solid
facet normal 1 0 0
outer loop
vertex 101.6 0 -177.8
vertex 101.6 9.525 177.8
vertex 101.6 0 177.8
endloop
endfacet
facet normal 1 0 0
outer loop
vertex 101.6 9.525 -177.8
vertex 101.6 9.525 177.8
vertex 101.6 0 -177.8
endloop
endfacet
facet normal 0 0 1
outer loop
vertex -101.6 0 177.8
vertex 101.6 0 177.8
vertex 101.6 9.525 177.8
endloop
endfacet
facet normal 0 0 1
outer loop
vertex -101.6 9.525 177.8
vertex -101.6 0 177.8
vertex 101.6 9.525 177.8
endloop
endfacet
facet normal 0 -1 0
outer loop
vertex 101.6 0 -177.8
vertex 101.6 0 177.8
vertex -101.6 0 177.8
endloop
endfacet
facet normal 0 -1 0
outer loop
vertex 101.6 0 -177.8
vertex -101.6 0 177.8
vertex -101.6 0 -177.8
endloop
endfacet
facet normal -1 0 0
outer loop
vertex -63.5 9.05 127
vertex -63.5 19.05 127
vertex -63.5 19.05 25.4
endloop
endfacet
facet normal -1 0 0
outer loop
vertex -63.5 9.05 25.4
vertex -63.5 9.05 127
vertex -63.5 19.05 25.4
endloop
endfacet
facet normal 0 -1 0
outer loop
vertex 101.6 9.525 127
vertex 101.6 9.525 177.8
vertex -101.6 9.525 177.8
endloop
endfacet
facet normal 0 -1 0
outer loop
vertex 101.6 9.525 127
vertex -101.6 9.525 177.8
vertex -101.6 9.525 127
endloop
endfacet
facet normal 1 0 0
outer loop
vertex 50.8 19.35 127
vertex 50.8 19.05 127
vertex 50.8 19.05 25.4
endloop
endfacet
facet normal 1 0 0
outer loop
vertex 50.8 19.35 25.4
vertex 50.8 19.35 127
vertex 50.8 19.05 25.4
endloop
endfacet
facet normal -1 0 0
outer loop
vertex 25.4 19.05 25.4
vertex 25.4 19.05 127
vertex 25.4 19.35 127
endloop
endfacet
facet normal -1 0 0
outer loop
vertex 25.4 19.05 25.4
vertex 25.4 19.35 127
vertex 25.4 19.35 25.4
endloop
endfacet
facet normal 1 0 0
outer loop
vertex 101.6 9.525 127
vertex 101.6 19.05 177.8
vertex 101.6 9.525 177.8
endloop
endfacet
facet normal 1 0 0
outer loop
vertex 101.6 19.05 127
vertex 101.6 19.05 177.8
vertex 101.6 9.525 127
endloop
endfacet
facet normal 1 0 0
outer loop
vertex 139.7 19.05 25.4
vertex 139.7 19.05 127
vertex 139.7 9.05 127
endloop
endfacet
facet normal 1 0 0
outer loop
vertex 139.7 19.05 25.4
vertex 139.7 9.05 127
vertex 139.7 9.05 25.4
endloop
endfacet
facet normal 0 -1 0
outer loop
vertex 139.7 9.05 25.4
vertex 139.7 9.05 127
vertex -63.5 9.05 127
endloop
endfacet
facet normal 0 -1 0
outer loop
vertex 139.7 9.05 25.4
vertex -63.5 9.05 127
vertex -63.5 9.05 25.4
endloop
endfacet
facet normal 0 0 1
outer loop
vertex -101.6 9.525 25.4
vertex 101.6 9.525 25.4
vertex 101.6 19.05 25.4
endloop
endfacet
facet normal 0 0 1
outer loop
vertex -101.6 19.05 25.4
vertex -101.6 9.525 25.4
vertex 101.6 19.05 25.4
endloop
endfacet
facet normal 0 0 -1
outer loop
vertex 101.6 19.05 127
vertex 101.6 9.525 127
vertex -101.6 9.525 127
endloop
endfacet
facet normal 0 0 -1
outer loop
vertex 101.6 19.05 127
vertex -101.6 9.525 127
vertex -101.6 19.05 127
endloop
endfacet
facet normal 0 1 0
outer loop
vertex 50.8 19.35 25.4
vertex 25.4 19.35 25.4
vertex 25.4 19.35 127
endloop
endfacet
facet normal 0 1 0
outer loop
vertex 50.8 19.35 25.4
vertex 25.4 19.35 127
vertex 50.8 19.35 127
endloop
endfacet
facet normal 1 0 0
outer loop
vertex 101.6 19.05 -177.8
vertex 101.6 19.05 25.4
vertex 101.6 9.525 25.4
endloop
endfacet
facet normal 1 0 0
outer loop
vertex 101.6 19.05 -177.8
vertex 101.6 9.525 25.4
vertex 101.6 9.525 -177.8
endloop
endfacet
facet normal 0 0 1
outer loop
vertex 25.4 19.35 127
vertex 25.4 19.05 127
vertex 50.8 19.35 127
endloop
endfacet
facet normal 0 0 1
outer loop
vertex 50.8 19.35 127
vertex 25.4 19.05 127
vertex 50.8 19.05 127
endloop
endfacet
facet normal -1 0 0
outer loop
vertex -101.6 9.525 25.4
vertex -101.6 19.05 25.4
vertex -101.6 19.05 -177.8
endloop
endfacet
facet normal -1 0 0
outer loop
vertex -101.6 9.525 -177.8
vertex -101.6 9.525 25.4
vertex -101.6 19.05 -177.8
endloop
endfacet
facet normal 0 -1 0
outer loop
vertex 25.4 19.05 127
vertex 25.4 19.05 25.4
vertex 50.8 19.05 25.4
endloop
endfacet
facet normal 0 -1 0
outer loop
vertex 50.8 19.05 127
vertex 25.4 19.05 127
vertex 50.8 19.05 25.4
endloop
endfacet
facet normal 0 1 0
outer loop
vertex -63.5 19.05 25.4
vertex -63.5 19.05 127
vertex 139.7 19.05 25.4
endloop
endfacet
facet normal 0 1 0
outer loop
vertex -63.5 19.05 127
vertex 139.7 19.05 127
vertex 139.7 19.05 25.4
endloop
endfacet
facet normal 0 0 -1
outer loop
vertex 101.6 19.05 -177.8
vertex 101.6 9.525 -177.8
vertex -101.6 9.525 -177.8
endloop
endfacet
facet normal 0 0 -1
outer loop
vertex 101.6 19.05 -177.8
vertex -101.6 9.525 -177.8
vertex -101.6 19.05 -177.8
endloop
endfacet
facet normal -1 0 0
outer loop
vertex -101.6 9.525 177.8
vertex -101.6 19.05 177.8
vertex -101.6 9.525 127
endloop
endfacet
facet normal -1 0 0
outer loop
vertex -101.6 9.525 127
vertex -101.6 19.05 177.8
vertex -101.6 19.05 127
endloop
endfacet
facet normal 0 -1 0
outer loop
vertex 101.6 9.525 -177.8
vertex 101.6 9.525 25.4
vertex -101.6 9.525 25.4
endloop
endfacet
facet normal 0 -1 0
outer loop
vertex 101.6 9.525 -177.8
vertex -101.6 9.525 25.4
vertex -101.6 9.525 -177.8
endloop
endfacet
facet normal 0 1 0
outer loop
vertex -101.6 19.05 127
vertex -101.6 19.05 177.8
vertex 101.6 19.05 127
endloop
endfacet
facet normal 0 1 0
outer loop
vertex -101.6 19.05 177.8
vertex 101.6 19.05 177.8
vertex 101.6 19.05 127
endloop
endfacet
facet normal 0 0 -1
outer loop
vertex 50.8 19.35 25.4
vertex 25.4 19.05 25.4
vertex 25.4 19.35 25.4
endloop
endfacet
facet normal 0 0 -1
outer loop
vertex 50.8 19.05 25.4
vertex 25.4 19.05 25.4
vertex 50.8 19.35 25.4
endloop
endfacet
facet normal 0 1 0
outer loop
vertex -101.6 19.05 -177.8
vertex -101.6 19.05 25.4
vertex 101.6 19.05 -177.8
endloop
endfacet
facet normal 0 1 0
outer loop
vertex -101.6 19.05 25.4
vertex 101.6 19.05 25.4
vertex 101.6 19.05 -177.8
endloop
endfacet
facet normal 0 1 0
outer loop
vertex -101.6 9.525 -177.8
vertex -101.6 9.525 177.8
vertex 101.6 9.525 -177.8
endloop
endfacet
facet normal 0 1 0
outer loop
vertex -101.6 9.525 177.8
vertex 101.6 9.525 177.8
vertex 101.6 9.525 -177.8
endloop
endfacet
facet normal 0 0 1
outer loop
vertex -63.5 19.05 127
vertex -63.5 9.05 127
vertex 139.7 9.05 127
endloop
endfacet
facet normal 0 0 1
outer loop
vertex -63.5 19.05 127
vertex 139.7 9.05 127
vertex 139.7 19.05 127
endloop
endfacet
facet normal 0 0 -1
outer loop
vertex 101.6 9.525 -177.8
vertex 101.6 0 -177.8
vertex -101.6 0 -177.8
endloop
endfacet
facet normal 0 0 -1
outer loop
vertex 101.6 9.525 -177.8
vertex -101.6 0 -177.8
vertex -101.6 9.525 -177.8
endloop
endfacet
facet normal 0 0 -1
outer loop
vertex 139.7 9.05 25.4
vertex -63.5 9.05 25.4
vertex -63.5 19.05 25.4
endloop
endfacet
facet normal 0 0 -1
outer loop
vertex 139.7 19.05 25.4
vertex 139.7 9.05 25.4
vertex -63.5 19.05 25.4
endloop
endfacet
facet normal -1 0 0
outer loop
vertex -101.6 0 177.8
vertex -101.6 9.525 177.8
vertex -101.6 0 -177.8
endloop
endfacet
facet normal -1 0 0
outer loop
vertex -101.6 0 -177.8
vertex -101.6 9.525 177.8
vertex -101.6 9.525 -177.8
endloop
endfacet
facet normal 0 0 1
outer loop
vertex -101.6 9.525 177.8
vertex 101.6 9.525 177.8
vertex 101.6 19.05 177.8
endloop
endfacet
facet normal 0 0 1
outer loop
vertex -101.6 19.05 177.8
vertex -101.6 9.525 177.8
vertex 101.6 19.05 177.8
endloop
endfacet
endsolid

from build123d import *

# Parameters (mm, degrees)
BOSS_EXTRUDE1_DEPTH = 101.6
SKETCH1_3_W         = 203.2
SKETCH1_3_H         = 9.525
BOSS_EXTRUDE2_DEPTH = 101.6
SKETCH1_4_W         = 50.8
SKETCH1_4_H         = 9.525
BOSS_EXTRUDE3_DEPTH = 101.6
EXTRUDE_THIN1_START = 38.1
SKETCH1_5_W         = 101.6
SKETCH1_5_H         = 10
EXTRUDE_THIN1_DEPTH = 101.6
SKETCH2_W           = 25.4
SKETCH2_H           = 101.6
BOSS_EXTRUDE4_DEPTH = 0.3


with BuildPart() as part:
    # Sketch1 → Boss-Extrude1 (new, symmetric)
    with BuildSketch(Plane(origin=(0, 0, 0), x_dir=(0, 0, -1), z_dir=(1, 0, 0))):
        Polygon((-177.8, 9.525), (-177.8, 0), (177.8, 0), (177.8, 9.525), (-25.4, 9.525), (-127, 9.525), align=None)
    extrude(amount=BOSS_EXTRUDE1_DEPTH, both=True)


with BuildPart() as body_2:
    # Sketch1<3> → Boss-Extrude2 (new, symmetric)
    with BuildSketch(Plane(origin=(0, 0, 0), x_dir=(0, 0, -1), z_dir=(1, 0, 0))):
        with Locations((76.2, 14.2875)):
            Rectangle(SKETCH1_3_W, SKETCH1_3_H)
    extrude(amount=BOSS_EXTRUDE2_DEPTH, both=True)


with BuildPart() as body_3:
    # Sketch1<4> → Boss-Extrude3 (new, symmetric)
    with BuildSketch(Plane(origin=(0, 0, 0), x_dir=(0, 0, -1), z_dir=(1, 0, 0))):
        with Locations((-152.4, 14.2875)):
            Rectangle(SKETCH1_4_W, SKETCH1_4_H)
    extrude(amount=BOSS_EXTRUDE3_DEPTH, both=True)


with BuildPart() as body_4:
    # Sketch1<5> → Extrude-Thin1 (new, symmetric)
    with BuildSketch(Plane(origin=(0, 0, 0), x_dir=(0, 0, -1), z_dir=(1, 0, 0)).offset(EXTRUDE_THIN1_START)):
        with Locations((-76.2, 14.05)):
            Rectangle(SKETCH1_5_W, SKETCH1_5_H)
    extrude(amount=EXTRUDE_THIN1_DEPTH, both=True)


with BuildPart() as body_5:
    # Sketch2 → Boss-Extrude4 (new body)
    with BuildSketch(Plane(origin=(0, 19.05, 0), x_dir=(1, 0, 0), z_dir=(0, 1, 0))):
        with Locations((38.1, -76.2)):
            Rectangle(SKETCH2_W, SKETCH2_H)
    extrude(amount=BOSS_EXTRUDE4_DEPTH)


solid = Compound([part.part, body_2.part, body_3.part, body_4.part, body_5.part])
